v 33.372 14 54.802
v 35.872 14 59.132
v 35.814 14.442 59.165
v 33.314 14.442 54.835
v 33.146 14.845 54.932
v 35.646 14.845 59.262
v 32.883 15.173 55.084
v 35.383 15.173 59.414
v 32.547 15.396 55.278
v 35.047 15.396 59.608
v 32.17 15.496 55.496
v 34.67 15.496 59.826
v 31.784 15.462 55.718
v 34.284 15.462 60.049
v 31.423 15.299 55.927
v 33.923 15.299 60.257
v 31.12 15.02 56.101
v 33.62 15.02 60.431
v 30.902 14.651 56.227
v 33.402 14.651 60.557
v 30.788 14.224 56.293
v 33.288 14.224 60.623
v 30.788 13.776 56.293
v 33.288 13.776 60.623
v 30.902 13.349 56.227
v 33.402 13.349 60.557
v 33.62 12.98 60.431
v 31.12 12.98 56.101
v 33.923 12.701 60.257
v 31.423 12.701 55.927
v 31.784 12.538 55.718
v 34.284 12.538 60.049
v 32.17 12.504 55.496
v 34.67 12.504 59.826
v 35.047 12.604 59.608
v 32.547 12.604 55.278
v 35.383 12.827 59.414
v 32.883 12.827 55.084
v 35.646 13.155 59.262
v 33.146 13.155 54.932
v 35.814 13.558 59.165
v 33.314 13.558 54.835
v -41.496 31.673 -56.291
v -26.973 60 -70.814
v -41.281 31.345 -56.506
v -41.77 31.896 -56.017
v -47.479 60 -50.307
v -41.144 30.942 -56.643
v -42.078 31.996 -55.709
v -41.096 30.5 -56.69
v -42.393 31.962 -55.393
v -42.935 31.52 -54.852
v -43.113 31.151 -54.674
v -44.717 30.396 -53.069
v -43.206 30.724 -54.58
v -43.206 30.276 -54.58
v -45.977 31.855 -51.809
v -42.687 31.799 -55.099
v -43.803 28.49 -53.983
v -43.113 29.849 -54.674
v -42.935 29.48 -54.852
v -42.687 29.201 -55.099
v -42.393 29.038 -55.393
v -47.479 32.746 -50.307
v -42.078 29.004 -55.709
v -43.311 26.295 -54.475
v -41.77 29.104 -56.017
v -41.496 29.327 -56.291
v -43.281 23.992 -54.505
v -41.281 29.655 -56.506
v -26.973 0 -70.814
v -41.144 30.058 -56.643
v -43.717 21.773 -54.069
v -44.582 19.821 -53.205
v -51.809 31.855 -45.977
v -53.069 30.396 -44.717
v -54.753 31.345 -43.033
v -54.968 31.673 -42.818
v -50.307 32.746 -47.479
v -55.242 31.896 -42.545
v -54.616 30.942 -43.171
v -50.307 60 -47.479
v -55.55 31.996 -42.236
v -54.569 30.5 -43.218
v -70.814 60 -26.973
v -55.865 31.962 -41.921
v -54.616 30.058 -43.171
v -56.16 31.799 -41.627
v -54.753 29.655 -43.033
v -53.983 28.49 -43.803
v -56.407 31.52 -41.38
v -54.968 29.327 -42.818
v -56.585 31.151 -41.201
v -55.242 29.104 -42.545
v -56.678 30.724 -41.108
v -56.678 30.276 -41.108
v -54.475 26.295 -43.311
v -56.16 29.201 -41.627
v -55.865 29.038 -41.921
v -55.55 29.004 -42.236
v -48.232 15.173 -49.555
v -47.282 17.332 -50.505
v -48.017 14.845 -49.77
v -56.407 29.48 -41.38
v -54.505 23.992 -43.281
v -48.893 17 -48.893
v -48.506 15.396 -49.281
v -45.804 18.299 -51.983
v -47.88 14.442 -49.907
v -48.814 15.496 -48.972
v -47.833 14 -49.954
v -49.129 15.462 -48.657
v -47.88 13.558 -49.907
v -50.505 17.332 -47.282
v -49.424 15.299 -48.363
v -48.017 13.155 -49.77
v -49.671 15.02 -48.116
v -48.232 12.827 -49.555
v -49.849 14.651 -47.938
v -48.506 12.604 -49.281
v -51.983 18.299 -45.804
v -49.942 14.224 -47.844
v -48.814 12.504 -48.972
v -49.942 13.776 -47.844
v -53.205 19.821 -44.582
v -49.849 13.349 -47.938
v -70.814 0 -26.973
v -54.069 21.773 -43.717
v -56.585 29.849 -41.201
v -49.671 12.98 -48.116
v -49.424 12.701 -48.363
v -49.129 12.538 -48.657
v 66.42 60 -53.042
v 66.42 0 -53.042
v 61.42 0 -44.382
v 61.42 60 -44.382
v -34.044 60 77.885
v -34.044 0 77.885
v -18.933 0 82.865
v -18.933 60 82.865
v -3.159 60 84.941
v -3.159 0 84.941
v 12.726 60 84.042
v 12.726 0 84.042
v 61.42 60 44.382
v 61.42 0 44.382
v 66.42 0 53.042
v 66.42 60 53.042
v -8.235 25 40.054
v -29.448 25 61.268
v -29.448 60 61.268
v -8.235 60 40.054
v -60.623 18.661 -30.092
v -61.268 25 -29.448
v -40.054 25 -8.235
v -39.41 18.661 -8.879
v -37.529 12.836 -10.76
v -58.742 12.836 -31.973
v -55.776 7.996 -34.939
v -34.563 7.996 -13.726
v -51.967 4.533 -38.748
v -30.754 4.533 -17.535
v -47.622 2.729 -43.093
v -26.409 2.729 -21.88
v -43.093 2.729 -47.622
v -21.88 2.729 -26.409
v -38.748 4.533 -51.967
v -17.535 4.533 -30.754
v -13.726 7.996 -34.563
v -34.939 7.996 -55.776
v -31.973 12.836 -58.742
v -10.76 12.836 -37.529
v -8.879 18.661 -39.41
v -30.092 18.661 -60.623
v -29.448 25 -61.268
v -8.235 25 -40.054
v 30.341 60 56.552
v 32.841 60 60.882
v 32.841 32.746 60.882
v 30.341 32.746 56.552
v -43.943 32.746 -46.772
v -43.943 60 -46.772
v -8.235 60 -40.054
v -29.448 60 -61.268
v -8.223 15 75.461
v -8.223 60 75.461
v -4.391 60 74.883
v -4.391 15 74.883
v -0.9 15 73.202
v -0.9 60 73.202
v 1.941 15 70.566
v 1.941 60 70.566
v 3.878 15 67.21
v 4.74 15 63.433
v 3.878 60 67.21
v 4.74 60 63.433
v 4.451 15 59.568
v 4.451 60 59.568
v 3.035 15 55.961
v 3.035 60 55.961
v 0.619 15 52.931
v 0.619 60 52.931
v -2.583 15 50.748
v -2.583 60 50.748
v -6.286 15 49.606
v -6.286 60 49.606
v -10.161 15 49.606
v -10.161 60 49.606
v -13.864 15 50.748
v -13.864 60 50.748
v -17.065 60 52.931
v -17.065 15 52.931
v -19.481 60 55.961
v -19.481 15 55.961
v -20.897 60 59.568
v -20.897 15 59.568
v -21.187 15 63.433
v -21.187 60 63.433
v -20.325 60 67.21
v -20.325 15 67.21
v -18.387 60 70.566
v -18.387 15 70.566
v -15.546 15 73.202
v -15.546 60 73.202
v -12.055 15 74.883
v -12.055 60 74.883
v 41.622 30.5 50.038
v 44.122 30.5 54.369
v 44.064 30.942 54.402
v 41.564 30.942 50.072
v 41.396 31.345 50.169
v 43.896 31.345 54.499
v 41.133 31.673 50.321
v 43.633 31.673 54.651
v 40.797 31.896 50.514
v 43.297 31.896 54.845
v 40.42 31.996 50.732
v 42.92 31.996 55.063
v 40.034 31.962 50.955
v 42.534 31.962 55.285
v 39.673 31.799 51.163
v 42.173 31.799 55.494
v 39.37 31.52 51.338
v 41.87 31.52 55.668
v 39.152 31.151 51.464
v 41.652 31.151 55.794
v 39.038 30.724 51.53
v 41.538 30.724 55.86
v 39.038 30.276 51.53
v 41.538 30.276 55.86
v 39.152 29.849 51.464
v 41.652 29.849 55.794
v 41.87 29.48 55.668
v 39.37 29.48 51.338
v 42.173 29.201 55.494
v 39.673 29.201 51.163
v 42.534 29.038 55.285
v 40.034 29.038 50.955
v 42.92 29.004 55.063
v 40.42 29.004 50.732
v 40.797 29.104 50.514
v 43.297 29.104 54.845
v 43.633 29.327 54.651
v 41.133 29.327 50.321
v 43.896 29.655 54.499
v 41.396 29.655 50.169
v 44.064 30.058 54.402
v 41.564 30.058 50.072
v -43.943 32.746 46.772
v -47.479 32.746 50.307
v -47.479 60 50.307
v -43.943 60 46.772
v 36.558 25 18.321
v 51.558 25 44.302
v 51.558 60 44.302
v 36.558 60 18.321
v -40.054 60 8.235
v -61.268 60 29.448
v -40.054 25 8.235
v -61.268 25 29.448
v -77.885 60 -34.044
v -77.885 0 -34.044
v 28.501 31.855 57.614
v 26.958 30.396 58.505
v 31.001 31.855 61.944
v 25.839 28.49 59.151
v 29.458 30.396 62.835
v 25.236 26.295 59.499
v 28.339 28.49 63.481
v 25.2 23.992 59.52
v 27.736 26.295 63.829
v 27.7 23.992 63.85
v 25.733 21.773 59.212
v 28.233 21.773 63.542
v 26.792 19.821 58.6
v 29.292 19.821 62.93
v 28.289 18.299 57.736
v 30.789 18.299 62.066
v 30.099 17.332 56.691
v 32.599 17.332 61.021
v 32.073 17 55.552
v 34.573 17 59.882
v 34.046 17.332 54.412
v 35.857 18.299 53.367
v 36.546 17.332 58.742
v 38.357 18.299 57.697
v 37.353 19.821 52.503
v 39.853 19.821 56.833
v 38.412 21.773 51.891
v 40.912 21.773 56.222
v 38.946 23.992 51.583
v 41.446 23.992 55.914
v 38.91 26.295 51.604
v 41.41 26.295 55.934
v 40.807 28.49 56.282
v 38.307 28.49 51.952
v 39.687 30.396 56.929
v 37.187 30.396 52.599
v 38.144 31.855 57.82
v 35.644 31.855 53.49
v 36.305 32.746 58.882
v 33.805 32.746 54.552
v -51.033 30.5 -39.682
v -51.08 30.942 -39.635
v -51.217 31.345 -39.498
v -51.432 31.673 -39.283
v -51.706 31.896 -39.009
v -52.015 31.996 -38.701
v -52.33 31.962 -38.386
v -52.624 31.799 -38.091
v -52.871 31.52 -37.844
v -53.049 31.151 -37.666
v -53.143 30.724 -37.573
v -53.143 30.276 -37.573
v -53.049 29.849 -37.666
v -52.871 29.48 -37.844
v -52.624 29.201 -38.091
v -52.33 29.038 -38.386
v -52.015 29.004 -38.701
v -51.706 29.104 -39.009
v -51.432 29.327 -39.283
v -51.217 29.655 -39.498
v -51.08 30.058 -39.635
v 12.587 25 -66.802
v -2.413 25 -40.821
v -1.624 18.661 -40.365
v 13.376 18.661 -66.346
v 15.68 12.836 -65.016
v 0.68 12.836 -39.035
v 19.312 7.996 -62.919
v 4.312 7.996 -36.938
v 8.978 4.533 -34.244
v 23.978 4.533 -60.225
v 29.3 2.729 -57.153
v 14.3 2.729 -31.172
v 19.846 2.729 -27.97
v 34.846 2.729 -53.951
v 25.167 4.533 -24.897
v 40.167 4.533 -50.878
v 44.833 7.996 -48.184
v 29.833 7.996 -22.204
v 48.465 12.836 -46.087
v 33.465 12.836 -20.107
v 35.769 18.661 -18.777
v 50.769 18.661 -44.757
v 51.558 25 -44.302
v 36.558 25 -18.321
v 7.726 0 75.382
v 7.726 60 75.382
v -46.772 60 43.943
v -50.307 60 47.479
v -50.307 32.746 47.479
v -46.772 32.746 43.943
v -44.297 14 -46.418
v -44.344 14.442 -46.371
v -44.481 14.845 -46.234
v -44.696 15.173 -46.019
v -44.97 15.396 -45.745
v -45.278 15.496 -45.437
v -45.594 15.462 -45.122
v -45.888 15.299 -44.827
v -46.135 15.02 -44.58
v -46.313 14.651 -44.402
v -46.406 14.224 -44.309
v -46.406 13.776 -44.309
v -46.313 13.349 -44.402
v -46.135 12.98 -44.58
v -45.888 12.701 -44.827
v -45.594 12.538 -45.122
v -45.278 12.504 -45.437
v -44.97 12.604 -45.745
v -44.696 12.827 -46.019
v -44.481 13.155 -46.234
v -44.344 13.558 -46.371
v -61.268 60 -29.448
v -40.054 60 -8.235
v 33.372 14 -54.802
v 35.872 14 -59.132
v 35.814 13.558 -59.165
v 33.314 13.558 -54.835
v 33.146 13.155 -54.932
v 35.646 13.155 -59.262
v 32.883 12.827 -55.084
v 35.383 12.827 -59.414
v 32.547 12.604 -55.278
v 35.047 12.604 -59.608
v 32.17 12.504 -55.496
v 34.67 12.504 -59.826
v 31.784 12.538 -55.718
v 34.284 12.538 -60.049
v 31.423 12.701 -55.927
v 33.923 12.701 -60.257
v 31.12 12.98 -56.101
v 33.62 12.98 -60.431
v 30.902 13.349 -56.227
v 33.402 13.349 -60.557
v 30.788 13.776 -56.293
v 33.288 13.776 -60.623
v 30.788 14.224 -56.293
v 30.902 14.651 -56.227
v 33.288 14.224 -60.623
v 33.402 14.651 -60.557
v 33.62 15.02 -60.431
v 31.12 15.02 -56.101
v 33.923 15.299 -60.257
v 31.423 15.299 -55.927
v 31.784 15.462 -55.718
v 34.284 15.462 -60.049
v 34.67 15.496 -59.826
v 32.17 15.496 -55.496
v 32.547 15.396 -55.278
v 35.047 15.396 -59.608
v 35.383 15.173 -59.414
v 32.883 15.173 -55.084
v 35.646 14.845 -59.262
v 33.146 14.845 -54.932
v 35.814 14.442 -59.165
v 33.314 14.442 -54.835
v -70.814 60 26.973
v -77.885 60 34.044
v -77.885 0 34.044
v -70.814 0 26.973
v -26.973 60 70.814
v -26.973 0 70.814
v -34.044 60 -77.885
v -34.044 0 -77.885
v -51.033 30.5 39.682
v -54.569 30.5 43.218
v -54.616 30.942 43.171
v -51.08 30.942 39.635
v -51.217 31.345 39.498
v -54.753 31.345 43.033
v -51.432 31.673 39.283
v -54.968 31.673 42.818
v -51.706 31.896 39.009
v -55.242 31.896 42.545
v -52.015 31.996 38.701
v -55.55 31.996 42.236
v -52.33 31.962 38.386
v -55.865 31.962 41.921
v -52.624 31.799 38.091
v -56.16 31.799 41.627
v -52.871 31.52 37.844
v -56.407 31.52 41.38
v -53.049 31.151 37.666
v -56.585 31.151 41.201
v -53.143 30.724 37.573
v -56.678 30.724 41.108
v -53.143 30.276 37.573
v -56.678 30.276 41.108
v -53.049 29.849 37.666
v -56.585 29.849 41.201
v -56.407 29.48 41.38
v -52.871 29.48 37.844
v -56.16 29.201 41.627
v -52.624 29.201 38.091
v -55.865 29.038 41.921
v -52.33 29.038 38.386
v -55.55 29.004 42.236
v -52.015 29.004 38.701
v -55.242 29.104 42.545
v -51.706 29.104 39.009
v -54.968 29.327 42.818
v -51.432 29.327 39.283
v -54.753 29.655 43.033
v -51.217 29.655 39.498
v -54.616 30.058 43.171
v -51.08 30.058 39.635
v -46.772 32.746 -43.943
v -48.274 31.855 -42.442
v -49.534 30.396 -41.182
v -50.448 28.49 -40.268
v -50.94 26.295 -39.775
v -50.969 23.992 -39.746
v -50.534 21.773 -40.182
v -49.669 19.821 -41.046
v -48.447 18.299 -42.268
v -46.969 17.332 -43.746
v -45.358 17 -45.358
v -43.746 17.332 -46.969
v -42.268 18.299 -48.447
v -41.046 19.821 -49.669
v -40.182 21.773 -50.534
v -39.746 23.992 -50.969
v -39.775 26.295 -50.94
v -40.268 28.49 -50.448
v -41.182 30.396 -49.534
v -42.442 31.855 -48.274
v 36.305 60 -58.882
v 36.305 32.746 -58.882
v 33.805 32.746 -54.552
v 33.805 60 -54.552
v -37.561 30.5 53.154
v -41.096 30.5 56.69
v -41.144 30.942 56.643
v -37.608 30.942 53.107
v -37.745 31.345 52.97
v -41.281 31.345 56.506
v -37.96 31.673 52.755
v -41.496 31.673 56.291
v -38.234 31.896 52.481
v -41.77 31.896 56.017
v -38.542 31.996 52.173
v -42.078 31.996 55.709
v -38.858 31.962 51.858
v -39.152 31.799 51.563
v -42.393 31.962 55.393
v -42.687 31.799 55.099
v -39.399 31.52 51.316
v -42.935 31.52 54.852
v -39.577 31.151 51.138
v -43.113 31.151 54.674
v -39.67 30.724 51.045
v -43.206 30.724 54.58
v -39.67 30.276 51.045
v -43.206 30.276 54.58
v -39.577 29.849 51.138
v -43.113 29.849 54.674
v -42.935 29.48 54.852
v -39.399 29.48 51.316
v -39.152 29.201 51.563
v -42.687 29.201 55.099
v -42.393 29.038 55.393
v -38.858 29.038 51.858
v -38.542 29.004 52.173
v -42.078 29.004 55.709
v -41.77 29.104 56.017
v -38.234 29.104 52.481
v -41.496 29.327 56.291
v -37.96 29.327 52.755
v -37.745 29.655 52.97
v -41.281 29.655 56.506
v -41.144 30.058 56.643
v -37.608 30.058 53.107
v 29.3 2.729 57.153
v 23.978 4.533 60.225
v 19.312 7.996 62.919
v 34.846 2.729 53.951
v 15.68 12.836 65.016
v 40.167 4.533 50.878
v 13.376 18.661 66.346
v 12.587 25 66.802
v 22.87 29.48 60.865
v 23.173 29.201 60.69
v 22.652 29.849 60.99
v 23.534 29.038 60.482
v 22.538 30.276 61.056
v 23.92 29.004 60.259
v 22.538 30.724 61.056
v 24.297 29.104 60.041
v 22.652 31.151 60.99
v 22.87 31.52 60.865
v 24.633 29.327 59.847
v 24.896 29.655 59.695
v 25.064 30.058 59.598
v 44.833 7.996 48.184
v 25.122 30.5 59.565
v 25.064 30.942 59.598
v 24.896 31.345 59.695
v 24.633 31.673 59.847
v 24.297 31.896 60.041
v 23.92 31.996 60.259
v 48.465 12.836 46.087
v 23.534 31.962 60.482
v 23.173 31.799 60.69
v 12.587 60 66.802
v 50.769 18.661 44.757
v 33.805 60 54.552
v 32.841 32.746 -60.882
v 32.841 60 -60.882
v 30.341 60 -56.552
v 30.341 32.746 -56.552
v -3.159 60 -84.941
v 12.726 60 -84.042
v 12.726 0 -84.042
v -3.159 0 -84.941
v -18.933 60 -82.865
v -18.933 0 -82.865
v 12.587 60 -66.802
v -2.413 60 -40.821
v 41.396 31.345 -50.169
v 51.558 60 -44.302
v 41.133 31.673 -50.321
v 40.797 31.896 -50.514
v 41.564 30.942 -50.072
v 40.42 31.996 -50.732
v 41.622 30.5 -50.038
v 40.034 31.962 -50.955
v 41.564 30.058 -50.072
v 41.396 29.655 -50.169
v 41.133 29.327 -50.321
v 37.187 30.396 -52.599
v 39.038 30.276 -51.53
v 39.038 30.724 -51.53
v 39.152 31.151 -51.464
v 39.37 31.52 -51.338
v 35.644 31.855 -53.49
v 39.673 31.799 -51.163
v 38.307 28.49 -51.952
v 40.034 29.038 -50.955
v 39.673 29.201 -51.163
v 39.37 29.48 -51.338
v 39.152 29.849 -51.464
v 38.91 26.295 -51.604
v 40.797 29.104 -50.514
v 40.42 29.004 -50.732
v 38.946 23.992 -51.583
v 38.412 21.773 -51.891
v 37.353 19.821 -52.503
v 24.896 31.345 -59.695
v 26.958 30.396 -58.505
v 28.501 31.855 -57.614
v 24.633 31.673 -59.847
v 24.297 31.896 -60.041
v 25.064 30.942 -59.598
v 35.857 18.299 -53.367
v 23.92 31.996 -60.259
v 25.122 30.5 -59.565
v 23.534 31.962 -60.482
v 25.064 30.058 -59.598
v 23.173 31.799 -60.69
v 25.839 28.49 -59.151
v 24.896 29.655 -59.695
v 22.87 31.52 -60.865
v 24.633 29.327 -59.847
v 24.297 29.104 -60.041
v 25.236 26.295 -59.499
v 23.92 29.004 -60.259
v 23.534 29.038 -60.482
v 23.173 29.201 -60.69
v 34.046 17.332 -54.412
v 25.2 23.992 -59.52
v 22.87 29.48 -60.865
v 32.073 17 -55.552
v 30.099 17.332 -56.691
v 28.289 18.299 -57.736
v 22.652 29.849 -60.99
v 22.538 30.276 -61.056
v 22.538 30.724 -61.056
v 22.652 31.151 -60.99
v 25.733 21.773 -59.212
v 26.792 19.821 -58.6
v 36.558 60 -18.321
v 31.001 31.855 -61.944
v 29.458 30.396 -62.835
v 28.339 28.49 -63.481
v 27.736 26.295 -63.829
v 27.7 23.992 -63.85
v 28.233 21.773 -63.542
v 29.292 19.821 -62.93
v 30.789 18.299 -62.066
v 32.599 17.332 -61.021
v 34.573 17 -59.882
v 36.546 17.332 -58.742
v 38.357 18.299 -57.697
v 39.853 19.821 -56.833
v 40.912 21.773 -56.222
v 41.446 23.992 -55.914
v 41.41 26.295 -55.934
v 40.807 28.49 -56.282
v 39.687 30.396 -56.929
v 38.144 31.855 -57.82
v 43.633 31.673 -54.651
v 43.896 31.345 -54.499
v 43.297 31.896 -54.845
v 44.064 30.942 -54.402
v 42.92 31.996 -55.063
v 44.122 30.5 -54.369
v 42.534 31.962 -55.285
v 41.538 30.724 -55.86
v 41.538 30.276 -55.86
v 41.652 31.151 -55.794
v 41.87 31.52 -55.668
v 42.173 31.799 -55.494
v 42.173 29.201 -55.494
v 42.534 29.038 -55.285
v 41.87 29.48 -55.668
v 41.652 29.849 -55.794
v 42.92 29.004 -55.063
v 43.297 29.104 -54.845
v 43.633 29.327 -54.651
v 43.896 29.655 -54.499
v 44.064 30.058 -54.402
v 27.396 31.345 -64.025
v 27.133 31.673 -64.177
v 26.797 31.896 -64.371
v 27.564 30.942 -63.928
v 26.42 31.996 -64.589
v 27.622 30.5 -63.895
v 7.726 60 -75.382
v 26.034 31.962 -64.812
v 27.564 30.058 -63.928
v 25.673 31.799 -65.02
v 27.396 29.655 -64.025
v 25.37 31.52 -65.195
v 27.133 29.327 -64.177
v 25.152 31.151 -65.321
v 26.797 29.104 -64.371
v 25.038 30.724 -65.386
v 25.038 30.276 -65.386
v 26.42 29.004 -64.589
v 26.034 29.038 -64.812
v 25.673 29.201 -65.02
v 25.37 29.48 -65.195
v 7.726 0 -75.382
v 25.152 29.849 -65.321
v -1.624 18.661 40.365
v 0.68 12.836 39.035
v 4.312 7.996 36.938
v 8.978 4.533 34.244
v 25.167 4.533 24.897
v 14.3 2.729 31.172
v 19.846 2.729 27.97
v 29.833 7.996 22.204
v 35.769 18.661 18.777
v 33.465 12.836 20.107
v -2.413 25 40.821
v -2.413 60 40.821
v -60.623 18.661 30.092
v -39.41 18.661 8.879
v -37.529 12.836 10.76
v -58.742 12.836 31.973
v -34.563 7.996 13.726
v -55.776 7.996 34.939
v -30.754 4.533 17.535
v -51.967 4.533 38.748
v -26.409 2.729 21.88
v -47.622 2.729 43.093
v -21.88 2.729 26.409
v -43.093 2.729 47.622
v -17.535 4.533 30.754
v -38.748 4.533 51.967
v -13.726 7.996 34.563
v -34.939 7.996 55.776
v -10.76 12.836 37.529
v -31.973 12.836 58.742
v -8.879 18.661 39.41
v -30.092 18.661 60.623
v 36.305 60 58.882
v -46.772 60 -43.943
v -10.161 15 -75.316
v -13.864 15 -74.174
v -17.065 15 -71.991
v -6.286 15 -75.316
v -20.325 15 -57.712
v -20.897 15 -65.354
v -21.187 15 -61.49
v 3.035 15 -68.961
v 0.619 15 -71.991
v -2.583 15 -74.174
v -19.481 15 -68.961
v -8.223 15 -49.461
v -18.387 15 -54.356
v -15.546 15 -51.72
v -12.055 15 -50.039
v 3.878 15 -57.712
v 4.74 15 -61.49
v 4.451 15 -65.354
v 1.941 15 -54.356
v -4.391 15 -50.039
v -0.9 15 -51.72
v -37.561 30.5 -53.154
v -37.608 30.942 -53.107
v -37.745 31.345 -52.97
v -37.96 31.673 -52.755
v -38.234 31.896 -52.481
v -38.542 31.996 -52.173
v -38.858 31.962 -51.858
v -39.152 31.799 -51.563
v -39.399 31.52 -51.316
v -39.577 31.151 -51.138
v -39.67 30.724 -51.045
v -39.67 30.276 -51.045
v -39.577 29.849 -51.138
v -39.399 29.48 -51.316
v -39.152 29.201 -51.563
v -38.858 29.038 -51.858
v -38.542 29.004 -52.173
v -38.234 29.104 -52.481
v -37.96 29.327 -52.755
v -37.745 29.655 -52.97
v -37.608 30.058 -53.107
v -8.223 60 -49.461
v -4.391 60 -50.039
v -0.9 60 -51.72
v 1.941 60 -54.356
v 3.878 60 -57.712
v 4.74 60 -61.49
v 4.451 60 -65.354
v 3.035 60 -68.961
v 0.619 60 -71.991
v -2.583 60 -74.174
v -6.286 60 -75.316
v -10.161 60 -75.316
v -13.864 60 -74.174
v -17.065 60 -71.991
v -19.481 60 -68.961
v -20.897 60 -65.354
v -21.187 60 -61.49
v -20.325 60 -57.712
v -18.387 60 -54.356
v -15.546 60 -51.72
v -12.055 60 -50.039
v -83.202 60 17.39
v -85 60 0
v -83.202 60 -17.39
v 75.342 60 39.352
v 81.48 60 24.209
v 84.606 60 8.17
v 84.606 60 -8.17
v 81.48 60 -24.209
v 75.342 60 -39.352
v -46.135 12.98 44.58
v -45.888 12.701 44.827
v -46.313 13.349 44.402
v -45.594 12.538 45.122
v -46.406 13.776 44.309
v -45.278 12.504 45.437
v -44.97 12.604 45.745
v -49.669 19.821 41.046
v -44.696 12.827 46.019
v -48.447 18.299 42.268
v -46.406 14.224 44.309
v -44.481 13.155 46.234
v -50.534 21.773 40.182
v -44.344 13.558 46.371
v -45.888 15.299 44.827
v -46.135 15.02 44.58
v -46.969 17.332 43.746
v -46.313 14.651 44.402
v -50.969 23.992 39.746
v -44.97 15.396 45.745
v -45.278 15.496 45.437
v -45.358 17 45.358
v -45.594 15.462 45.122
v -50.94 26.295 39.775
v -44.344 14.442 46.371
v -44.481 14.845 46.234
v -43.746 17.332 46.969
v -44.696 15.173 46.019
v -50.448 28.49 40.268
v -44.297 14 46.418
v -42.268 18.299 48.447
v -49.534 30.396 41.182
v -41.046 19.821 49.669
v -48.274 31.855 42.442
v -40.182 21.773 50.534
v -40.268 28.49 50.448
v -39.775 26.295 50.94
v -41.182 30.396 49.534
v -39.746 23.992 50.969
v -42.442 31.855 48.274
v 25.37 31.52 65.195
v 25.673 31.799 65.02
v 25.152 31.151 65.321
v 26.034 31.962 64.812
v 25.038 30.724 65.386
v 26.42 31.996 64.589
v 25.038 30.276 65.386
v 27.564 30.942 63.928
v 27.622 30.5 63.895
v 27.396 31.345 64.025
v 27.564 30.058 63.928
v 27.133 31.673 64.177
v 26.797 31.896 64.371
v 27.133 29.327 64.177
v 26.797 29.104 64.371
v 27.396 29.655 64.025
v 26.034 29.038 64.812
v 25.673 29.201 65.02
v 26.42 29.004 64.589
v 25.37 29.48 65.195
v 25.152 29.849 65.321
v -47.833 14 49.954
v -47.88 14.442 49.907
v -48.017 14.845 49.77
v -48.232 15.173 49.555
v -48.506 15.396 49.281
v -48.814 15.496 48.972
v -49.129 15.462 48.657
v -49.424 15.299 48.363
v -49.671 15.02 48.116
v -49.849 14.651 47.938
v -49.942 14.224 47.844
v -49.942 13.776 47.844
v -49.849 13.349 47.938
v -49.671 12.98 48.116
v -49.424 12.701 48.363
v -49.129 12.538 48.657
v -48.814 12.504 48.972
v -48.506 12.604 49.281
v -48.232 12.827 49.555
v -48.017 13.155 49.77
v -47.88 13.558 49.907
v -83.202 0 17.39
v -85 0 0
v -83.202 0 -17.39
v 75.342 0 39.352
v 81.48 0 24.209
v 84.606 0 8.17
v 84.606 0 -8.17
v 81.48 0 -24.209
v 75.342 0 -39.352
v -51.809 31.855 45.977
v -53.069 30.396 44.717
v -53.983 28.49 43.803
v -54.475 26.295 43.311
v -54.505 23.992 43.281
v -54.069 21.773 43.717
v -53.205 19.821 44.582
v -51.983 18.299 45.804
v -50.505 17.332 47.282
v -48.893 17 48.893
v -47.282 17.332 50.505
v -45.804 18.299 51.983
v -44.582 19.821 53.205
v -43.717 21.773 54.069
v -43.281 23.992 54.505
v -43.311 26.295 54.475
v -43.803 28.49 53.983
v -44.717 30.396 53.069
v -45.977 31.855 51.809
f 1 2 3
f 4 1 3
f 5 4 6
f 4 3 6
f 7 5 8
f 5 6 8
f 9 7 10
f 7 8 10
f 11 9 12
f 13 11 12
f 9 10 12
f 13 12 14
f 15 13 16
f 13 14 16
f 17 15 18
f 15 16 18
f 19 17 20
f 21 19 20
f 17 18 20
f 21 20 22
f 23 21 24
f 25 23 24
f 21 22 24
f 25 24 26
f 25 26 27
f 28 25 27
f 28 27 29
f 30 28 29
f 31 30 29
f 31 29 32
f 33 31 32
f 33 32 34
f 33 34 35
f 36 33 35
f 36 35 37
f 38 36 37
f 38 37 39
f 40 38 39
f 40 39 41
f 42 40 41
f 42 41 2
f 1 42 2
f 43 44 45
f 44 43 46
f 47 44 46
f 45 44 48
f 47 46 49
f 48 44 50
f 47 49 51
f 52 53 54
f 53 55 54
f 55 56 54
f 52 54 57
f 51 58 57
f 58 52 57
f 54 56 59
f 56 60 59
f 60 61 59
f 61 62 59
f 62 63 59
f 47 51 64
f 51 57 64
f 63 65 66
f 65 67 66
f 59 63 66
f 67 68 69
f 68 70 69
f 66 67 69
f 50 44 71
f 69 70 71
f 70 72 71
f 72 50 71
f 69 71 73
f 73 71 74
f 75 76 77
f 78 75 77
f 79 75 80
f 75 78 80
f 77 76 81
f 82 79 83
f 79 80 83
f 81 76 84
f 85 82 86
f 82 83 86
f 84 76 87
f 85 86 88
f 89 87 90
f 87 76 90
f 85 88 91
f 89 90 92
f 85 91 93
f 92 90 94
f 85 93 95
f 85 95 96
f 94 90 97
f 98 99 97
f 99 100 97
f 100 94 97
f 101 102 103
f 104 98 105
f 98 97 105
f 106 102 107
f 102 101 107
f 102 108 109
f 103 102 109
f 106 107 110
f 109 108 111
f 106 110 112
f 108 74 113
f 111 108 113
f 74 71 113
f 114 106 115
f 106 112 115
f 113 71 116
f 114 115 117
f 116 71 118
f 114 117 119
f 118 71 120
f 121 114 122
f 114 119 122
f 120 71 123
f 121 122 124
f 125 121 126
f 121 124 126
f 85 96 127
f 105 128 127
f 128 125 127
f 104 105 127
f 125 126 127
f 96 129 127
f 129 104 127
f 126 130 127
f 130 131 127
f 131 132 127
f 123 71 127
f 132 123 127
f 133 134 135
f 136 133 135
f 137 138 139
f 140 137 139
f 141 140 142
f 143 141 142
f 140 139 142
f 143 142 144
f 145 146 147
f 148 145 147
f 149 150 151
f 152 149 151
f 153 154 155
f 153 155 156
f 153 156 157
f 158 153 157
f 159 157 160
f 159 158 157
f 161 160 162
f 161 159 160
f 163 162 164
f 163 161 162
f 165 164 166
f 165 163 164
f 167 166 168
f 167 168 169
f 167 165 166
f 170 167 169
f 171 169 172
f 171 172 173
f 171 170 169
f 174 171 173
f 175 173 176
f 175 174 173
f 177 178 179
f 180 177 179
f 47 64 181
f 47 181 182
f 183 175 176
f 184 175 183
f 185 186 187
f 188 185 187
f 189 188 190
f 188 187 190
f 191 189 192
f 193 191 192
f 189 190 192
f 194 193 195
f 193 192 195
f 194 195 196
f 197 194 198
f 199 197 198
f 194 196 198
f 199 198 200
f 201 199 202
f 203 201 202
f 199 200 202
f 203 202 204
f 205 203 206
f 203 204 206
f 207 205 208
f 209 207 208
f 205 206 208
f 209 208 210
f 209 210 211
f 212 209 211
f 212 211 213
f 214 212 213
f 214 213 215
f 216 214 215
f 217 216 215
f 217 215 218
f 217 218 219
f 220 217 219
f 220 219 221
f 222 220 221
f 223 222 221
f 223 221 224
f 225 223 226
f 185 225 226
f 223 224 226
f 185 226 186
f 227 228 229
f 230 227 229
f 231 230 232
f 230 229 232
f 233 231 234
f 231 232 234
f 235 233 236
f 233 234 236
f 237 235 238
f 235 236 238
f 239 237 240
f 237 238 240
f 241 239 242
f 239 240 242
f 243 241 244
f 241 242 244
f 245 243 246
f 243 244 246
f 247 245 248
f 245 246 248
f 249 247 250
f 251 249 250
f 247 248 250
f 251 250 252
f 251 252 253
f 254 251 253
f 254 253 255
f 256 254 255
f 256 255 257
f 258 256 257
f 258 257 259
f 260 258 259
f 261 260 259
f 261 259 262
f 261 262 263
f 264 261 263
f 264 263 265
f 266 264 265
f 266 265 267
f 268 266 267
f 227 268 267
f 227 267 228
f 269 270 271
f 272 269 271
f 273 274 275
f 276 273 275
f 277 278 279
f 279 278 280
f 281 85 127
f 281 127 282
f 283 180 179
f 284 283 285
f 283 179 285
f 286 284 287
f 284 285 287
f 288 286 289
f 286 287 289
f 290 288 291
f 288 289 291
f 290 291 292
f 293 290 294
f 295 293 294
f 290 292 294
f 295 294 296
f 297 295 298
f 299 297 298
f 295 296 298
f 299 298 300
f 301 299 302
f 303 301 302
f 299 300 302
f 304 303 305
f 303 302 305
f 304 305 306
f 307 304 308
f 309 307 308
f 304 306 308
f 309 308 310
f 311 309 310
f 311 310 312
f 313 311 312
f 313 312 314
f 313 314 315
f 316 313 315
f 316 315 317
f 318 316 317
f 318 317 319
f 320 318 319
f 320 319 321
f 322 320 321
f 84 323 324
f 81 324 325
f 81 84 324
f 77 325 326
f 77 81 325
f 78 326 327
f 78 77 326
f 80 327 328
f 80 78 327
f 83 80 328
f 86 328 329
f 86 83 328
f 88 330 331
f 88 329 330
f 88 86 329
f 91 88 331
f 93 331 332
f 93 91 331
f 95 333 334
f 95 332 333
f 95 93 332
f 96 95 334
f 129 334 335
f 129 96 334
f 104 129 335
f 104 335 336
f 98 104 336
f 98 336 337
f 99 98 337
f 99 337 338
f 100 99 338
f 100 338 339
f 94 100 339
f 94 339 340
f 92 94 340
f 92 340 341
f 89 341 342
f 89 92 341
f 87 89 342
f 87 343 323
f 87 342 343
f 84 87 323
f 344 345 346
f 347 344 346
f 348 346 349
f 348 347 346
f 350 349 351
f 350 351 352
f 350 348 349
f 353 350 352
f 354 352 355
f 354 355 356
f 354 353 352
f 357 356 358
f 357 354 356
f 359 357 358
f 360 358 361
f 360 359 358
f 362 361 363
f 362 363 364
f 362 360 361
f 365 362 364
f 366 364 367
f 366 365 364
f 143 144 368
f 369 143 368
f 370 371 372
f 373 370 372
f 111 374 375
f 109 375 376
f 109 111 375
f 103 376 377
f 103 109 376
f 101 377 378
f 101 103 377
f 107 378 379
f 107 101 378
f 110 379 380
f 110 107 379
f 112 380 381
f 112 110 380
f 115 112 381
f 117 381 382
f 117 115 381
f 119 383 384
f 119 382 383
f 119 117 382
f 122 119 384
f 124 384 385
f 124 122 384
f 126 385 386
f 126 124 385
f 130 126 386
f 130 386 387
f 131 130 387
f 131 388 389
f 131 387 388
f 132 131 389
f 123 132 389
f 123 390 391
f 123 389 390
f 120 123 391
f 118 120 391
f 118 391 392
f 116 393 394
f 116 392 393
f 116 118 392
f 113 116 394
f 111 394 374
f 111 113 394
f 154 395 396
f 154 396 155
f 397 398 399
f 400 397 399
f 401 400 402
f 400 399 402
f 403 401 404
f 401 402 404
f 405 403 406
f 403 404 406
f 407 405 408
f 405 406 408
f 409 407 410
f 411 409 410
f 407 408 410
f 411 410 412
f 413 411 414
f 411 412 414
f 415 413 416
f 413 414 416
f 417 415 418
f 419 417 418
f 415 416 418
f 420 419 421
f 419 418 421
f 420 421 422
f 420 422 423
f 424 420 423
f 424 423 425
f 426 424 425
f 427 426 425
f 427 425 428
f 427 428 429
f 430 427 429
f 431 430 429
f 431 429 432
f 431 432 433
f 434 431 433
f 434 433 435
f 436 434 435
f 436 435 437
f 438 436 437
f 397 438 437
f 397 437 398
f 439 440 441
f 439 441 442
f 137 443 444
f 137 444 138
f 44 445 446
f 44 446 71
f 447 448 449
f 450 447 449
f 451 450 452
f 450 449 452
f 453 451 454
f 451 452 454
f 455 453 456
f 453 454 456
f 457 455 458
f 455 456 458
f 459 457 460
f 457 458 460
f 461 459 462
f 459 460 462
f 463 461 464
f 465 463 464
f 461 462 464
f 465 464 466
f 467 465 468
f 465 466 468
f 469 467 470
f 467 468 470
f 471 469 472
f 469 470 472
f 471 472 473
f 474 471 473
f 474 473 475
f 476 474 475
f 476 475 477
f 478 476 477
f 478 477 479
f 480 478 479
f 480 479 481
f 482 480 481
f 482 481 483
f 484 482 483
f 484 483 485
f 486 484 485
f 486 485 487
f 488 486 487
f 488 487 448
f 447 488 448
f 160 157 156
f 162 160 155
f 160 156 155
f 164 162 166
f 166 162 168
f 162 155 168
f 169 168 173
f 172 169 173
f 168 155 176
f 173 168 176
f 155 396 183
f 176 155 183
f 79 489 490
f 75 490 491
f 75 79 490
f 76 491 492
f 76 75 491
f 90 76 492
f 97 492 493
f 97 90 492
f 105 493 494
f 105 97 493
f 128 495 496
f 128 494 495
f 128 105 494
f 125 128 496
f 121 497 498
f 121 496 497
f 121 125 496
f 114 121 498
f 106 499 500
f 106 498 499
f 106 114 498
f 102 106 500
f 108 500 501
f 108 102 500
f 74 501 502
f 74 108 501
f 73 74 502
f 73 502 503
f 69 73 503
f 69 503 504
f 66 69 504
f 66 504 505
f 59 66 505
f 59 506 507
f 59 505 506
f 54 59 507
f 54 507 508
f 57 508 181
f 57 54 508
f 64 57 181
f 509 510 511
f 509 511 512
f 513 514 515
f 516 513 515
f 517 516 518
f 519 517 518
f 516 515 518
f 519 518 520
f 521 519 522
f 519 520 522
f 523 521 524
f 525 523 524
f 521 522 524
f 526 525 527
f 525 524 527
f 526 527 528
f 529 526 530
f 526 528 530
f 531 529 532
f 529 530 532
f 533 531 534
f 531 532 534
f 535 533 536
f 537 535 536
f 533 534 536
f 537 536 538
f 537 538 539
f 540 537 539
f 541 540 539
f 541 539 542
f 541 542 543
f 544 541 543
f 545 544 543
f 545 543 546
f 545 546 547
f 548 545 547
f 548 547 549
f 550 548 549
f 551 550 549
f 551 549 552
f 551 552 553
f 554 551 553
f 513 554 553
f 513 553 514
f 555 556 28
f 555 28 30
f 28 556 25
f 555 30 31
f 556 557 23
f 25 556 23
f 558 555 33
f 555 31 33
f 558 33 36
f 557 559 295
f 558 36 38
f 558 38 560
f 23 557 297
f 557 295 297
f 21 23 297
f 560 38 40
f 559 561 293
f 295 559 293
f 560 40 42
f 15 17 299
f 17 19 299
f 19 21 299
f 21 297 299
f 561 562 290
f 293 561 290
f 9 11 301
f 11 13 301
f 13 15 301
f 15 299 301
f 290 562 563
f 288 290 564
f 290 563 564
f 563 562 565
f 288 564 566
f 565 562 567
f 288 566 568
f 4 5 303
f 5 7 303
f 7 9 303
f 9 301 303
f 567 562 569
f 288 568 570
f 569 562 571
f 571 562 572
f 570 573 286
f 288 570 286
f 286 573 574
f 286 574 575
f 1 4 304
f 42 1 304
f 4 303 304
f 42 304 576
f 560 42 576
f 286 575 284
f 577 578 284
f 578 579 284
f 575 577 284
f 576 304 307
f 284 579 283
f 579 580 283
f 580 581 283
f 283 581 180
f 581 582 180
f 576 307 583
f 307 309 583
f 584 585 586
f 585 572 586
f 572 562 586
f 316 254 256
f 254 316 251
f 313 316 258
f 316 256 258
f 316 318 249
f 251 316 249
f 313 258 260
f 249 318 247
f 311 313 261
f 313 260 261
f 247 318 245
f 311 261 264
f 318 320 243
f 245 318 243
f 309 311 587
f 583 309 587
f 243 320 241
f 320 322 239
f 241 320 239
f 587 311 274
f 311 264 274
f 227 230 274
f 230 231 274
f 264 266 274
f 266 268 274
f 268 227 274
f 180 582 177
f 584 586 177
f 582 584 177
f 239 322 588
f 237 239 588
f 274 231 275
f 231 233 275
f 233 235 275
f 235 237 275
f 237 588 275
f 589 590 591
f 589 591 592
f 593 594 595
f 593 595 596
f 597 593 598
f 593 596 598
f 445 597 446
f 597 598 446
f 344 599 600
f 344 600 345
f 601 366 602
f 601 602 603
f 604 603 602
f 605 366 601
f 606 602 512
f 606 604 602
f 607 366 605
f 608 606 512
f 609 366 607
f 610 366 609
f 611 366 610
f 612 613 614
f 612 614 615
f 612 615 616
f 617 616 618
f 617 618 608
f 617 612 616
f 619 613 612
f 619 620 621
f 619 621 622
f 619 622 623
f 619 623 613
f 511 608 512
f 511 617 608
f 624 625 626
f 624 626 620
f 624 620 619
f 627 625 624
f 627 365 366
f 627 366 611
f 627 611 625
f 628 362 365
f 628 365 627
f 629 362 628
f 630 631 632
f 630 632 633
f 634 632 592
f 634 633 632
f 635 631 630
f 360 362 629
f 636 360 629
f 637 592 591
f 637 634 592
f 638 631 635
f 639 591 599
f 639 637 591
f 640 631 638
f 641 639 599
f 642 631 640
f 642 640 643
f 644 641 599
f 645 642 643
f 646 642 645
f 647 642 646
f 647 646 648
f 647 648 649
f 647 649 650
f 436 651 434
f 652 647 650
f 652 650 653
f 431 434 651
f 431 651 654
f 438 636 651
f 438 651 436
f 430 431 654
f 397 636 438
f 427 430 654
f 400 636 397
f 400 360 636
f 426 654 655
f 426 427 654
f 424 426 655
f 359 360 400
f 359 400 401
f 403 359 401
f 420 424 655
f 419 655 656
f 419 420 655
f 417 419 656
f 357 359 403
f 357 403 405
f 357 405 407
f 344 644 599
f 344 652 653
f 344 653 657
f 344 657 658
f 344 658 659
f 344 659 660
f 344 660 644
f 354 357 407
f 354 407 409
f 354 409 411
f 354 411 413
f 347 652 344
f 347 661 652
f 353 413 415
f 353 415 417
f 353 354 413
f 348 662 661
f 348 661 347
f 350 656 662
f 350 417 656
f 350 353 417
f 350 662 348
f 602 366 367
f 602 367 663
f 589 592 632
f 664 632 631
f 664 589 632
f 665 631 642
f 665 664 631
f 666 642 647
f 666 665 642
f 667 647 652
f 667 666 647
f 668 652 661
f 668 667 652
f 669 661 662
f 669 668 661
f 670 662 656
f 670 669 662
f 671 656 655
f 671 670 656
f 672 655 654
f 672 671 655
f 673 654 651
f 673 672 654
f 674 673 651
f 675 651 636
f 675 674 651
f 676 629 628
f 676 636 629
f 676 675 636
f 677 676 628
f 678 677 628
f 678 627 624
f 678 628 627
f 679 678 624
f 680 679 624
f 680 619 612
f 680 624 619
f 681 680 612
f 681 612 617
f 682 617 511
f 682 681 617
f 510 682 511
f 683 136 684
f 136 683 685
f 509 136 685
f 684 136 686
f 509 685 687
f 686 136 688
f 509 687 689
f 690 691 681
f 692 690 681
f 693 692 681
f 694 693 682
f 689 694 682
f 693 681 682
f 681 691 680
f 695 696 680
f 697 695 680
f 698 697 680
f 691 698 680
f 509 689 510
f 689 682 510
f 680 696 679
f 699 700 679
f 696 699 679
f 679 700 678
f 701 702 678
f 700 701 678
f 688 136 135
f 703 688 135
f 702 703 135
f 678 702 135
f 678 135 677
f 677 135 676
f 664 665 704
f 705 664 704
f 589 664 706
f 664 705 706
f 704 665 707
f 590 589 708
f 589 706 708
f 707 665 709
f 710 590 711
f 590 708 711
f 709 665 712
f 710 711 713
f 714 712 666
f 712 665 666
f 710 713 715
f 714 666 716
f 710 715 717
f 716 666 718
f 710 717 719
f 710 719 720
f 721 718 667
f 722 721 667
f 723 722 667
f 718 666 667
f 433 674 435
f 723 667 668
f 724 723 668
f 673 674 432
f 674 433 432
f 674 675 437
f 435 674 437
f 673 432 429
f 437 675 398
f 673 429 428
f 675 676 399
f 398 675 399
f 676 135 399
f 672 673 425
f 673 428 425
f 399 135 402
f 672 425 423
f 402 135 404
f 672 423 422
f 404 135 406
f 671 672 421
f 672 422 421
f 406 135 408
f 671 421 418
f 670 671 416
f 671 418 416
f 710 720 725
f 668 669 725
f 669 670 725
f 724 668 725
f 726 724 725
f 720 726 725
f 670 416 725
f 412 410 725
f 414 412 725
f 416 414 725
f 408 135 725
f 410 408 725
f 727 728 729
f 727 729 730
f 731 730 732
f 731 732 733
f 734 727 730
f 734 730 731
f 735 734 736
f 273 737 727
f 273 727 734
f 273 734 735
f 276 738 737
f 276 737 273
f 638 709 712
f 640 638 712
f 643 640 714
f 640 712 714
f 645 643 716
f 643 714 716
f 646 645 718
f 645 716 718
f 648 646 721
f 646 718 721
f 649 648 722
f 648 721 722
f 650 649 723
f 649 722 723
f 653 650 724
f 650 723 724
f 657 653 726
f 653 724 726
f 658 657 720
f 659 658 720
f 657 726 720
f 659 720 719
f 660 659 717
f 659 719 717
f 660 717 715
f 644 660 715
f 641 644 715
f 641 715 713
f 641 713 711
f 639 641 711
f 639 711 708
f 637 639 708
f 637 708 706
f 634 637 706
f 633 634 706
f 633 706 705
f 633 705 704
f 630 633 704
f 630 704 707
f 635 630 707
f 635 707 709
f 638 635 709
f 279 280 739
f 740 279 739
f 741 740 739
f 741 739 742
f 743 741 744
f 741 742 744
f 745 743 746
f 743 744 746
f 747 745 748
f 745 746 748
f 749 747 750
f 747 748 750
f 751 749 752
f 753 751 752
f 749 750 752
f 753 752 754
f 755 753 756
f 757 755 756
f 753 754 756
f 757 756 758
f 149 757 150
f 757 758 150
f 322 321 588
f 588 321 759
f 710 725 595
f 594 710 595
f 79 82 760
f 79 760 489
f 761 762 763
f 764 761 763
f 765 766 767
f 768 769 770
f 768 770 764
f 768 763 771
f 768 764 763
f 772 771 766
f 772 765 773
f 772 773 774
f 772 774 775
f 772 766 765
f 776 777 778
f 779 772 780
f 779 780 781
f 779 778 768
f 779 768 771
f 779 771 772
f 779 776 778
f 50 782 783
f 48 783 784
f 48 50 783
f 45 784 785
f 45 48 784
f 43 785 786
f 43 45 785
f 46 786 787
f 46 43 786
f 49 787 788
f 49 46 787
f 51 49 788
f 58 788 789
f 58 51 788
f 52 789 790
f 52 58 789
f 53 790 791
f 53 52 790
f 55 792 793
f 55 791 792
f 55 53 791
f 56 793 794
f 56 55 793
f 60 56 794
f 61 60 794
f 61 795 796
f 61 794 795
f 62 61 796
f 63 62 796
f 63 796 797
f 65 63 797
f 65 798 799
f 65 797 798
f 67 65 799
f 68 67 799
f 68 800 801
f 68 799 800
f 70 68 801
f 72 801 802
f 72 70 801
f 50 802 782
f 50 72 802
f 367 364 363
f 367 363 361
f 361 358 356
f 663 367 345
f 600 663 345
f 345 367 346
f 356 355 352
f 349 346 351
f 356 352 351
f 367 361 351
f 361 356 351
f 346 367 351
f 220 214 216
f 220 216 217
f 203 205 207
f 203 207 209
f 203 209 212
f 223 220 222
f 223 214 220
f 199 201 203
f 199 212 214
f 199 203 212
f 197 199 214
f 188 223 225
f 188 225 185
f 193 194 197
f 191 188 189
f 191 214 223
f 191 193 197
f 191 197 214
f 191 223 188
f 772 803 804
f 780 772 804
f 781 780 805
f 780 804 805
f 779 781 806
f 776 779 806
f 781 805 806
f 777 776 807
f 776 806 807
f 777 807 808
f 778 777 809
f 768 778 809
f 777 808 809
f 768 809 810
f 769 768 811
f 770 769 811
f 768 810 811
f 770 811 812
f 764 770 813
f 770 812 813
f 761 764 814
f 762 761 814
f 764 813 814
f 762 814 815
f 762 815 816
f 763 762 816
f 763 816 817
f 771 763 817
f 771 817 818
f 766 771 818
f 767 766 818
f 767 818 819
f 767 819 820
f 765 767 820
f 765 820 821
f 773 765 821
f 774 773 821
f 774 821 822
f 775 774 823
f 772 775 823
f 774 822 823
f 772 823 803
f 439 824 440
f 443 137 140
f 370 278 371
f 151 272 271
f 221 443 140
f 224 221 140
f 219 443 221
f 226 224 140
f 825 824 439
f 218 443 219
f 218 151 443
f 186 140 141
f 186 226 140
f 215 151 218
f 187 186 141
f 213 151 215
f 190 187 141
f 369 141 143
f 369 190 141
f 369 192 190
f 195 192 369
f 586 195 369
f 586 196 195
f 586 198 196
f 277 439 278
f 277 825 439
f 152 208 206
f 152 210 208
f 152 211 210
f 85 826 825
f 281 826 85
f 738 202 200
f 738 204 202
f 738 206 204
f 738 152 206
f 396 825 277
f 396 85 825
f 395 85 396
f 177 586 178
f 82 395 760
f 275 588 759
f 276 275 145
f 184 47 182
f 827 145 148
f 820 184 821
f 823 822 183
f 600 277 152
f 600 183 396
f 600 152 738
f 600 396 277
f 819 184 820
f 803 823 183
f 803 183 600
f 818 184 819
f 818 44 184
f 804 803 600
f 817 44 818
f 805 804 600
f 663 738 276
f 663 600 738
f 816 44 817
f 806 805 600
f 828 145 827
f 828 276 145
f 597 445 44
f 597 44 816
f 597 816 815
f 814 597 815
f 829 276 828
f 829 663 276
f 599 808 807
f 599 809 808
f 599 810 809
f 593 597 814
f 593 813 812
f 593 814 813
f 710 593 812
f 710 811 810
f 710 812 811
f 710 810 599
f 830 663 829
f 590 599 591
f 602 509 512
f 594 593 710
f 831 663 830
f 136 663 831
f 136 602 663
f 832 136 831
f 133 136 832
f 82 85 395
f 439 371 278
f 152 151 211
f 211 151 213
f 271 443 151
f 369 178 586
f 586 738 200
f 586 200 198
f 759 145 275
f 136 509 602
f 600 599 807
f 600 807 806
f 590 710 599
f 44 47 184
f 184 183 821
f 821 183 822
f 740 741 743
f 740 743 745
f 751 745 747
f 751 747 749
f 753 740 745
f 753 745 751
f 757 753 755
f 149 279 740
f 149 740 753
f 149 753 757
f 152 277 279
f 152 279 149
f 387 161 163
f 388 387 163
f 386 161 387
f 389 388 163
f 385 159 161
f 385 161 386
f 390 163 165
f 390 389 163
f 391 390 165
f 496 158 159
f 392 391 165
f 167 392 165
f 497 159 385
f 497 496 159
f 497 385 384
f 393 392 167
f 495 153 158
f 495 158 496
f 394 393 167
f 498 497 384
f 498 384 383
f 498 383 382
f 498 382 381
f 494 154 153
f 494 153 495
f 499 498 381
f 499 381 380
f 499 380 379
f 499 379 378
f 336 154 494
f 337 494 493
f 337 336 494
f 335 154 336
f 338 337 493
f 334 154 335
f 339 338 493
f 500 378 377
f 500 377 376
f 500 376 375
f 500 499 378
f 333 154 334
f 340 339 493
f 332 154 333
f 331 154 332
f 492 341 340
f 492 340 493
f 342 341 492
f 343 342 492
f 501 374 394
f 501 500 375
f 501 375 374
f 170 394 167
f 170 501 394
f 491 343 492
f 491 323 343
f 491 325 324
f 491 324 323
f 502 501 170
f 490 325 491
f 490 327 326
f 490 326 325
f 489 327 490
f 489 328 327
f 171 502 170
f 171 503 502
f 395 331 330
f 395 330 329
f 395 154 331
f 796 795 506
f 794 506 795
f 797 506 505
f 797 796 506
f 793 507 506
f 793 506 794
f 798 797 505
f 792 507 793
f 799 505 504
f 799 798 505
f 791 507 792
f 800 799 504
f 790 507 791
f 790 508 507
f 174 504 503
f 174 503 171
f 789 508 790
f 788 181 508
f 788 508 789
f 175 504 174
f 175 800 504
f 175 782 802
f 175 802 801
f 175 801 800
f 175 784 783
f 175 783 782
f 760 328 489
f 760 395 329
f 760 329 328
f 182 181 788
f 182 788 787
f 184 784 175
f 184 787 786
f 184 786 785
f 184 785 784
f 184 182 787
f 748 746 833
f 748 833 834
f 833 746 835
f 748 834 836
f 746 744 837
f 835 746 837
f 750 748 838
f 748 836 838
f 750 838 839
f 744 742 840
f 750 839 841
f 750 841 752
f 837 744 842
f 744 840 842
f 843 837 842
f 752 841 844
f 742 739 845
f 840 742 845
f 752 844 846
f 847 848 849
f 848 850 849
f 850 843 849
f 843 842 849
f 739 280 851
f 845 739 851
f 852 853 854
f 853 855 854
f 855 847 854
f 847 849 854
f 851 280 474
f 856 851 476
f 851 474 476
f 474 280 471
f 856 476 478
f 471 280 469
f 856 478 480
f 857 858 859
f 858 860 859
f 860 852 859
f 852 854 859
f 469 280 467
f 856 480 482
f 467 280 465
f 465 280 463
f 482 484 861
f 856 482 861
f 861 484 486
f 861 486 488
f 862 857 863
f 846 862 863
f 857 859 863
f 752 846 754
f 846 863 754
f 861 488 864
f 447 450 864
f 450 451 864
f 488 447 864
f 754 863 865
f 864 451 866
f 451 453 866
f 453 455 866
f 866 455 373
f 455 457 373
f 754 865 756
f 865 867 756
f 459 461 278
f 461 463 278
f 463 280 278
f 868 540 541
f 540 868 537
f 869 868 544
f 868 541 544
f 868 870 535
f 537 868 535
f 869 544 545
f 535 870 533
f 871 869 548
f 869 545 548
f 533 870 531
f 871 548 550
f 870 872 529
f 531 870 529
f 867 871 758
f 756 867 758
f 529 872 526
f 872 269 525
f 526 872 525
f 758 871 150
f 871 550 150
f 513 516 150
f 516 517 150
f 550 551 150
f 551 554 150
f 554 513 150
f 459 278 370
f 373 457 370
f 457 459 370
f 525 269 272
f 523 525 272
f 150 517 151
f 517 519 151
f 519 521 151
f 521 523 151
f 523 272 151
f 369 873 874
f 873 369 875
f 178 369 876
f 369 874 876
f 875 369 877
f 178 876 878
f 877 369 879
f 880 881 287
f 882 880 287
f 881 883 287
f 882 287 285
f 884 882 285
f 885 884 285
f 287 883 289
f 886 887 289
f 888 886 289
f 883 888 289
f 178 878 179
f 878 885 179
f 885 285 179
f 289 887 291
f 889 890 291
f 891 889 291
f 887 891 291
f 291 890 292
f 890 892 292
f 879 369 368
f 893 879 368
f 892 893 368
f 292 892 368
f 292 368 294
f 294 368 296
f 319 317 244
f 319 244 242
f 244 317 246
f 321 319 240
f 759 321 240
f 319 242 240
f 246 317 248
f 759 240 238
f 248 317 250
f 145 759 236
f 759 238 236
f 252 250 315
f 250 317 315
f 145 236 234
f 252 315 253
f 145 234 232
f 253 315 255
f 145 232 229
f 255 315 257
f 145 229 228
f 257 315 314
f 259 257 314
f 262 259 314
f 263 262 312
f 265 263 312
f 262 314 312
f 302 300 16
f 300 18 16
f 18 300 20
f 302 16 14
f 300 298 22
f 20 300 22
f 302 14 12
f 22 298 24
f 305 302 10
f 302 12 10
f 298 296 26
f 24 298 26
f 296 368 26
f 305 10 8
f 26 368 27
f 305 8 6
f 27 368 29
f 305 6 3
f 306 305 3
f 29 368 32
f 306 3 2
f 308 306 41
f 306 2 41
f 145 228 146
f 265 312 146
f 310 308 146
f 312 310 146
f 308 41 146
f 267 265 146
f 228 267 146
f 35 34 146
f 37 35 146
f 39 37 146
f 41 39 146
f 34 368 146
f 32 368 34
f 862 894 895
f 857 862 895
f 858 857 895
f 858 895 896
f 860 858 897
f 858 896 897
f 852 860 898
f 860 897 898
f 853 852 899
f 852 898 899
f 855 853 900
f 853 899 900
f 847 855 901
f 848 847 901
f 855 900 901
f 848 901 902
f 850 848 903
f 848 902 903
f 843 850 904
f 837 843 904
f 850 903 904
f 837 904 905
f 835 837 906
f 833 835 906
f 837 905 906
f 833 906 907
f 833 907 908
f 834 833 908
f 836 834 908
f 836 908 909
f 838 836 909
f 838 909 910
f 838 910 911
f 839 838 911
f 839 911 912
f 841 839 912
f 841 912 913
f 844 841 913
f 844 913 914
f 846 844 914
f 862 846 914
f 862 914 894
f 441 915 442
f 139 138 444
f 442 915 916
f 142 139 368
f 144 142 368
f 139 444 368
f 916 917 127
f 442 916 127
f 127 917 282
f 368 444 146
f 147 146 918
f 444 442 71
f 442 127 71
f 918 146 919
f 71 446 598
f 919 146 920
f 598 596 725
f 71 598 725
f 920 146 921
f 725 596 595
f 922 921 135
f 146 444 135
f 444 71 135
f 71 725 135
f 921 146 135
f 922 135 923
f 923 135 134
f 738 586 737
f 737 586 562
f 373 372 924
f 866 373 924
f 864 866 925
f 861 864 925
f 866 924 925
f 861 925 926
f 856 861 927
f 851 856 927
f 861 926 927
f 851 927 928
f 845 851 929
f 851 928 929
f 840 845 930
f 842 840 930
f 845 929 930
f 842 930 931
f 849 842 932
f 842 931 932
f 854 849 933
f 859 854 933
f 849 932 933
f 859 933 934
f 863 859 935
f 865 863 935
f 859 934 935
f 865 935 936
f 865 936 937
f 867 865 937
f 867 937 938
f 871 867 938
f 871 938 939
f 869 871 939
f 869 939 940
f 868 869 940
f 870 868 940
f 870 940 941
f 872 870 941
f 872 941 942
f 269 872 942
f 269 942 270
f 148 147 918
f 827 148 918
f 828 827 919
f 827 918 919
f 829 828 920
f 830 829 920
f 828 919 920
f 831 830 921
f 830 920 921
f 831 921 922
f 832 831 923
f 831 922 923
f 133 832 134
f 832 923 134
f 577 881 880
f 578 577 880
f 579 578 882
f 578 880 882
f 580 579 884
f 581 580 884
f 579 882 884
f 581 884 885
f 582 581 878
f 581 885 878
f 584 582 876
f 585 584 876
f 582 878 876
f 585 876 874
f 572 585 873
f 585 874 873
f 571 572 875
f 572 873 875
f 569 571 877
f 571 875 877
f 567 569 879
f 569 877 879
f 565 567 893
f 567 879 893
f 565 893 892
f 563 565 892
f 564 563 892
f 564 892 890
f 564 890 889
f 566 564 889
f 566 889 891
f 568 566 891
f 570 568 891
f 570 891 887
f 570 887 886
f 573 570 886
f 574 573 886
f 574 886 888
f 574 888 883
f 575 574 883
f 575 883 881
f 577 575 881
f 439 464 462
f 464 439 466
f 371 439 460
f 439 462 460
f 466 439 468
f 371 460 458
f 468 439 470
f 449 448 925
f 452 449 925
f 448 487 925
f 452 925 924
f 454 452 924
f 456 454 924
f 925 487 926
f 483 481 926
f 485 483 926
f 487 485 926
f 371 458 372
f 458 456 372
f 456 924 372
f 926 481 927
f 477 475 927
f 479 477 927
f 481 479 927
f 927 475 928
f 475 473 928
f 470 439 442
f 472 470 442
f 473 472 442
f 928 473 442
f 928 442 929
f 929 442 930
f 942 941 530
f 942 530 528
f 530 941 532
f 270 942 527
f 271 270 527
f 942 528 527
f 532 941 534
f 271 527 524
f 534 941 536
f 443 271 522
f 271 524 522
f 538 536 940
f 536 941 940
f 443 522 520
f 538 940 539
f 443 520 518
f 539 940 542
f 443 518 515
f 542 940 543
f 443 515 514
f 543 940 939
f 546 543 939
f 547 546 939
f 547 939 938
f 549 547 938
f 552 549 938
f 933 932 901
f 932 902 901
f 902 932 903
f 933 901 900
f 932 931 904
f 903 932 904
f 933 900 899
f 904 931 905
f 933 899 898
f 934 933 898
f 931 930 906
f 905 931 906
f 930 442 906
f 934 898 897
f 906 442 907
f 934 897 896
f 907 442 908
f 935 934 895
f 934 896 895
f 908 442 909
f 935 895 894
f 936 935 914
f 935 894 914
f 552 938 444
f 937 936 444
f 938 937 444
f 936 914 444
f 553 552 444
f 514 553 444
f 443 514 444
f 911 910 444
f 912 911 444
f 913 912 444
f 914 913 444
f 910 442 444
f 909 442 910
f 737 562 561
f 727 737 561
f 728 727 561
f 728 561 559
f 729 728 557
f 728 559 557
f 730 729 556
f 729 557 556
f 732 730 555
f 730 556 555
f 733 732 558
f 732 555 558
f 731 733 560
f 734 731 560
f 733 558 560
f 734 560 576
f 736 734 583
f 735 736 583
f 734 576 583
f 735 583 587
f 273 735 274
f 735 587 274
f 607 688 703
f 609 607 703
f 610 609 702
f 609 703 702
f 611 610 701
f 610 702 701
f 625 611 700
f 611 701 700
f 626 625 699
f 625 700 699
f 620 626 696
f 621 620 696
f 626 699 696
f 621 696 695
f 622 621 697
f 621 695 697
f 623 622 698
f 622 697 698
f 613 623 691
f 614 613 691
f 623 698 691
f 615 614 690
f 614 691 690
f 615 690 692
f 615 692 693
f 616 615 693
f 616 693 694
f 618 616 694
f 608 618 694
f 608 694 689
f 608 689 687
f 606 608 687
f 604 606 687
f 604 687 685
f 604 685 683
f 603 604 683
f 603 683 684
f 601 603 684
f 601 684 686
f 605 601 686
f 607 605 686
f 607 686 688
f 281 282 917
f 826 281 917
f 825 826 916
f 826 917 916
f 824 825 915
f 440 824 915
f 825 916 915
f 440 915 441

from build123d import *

# Parameters (mm, degrees)
BASE_DEPTH                = 60
MOTOR_TRASEIRO_START      = -5
MOTOR_TRASEIRO_DEPTH      = 30
ESBO_O3_10_R              = 1.5
MOTOR_EIXO_DEPTH          = 25
PADR_OCIRCULAR1_COUNT     = 2
PADR_OCIRCULAR1_ANGLE     = 285
ESPELHAR3_START           = -5
ESPELHAR3_COPY_1_DEPTH    = 30
ESPELHAR3_COPY_2_SKETCH_R = 1.5
ESPELHAR3_COPY_2_DEPTH    = 25
ESBO_O16_R                = 13
CAPACITORES_DEPTH         = 45


with BuildPart() as part:
    # Esboço1 → Base (new body)
    with BuildSketch(Plane(origin=(0, 0, 0), x_dir=(1, 0, 0), z_dir=(0, 1, 0))):
        with BuildLine():
            Line((-70.813516723, -26.97289629), (-26.97289629, -70.813516723))
            Line((-26.97289629, -70.813516723), (-34.043964102, -77.884584535))
            ThreePointArc((-34.043964102, -77.884584535), (-11.094726339, -84.272813217), (12.725930358, -84.041957953))
            Line((12.725930358, -84.041957953), (7.725930358, -75.381703915))
            Line((7.725930358, -75.381703915), (61.419505392, -44.381703915))
            Line((61.419505392, -44.381703915), (66.419505392, -53.041957953))
            ThreePointArc((66.419505392, -53.041957953), (85, 0), (66.419505392, 53.041957953))
            Line((66.419505392, 53.041957953), (61.419505392, 44.381703915))
            Line((61.419505392, 44.381703915), (7.725930358, 75.381703915))
            Line((7.725930358, 75.381703915), (12.725930358, 84.041957953))
            ThreePointArc((12.725930358, 84.041957953), (-11.094726339, 84.272813217), (-34.043964102, 77.884584535))
            Line((-34.043964102, 77.884584535), (-26.97289629, 70.813516723))
            Line((-26.97289629, 70.813516723), (-70.813516723, 26.97289629))
            Line((-70.813516723, 26.97289629), (-77.884584535, 34.043964102))
            ThreePointArc((-77.884584535, 34.043964102), (-85, 0), (-77.884584535, -34.043964102))
            Line((-77.884584535, -34.043964102), (-70.813516723, -26.97289629))
        make_face()
    extrude(amount=BASE_DEPTH)

    # Esboço3 → Motor-traseiro (cut)
    with BuildSketch(Plane(origin=(-48.893206507, 0, 48.893206507), x_dir=(0.7071067811865515, 0, 0.7071067811865436), z_dir=(-0.7071067811865436, 0, 0.7071067811865515)).offset(MOTOR_TRASEIRO_START)):
        with BuildLine():
            ThreePointArc((-22.5, 25), (0, 2.5), (22.5, 25))
            Line((22.5, 25), (22.5, 80))
            Line((22.5, 80), (-22.5, 80))
            Line((-22.5, 80), (-22.5, 25))
        make_face()
    motor_traseiro = extrude(amount=-MOTOR_TRASEIRO_DEPTH, mode=Mode.SUBTRACT)

    # Esboço3<10> → Motor-eixo (cut)
    with BuildSketch(Plane(origin=(-48.893206507, 0, 48.893206507), x_dir=(0.7071067811865515, 0, 0.7071067811865436), z_dir=(-0.7071067811865436, 0, 0.7071067811865515))):
        with BuildLine():
            Line((2, 32.745966692), (2, 70))
            Line((2, 70), (-2, 70))
            Line((-2, 70), (-2, 32.745966692))
            ThreePointArc((-2, 32.745966692), (0, 17), (2, 32.745966692))
        make_face()
        with Locations((0, 14)):
            Circle(ESBO_O3_10_R)
        with Locations((-9.526279442, 30.5)):
            Circle(ESBO_O3_10_R)
        with Locations((9.526279442, 30.5)):
            Circle(ESBO_O3_10_R)
    motor_eixo = extrude(amount=-MOTOR_EIXO_DEPTH, mode=Mode.SUBTRACT)

    # PadrãoCircular1: Motor-traseiro, Motor-eixo ×2 about axis
    padr_ocircular1_axis = Axis((0, 60, 0), (0, -1, 0))
    add([motor_traseiro.rotate(padr_ocircular1_axis, i * PADR_OCIRCULAR1_ANGLE / (PADR_OCIRCULAR1_COUNT - 1)) for i in range(1, PADR_OCIRCULAR1_COUNT)], mode=Mode.SUBTRACT)
    add([motor_eixo.rotate(padr_ocircular1_axis, i * PADR_OCIRCULAR1_ANGLE / (PADR_OCIRCULAR1_COUNT - 1)) for i in range(1, PADR_OCIRCULAR1_COUNT)], mode=Mode.SUBTRACT)

    # Espelhar3: Motor-traseiro, Motor-eixo across plane
    add(motor_traseiro.mirror(Plane.XY), mode=Mode.SUBTRACT)
    add(motor_eixo.mirror(Plane.XY), mode=Mode.SUBTRACT)

    # Espelhar3 copy 1 sketch → Espelhar3 copy 1 (cut)
    with BuildSketch(Plane(origin=(34.572717875, 0, -59.881703915), x_dir=(0.8660254037844427, 0, 0.499999999999993), z_dir=(0.499999999999993, 0, -0.8660254037844427)).offset(ESPELHAR3_START)):
        with BuildLine():
            ThreePointArc((-22.5, -25), (0, -2.5), (22.5, -25))
            Line((22.5, -25), (22.5, -80))
            Line((22.5, -80), (-22.5, -80))
            Line((-22.5, -80), (-22.5, -25))
        make_face()
    extrude(amount=-ESPELHAR3_COPY_1_DEPTH, mode=Mode.SUBTRACT)

    # Espelhar3 copy 2 sketch → Espelhar3 copy 2 (cut)
    with BuildSketch(Plane(origin=(34.572717875, 0, -59.881703915), x_dir=(0.8660254037844427, 0, 0.499999999999993), z_dir=(0.499999999999993, 0, -0.8660254037844427))):
        with BuildLine():
            Line((2, -32.745966692), (2, -70))
            Line((2, -70), (-2, -70))
            Line((-2, -70), (-2, -32.745966692))
            ThreePointArc((-2, -32.745966692), (0, -17), (2, -32.745966692))
        make_face()
        with Locations((0, -14)):
            Circle(ESPELHAR3_COPY_2_SKETCH_R)
        with Locations((-9.526279442, -30.5)):
            Circle(ESPELHAR3_COPY_2_SKETCH_R)
        with Locations((9.526279442, -30.5)):
            Circle(ESPELHAR3_COPY_2_SKETCH_R)
    extrude(amount=-ESPELHAR3_COPY_2_DEPTH, mode=Mode.SUBTRACT)

    # Esboço16 → Capacitores (cut)
    with BuildSketch(Plane(origin=(0, 60, 0), x_dir=(1, 0, 0), z_dir=(0, 1, 0))):
        with Locations(Location((-8.22315011, -62.461026267, 0), (0, 0, 270))):
            Circle(ESBO_O16_R)
        with Locations(Location((-8.22315011, 62.461026267, 0), (0, 0, 270))):
            Circle(ESBO_O16_R)
    extrude(amount=-CAPACITORES_DEPTH, mode=Mode.SUBTRACT)


solid = part.part
